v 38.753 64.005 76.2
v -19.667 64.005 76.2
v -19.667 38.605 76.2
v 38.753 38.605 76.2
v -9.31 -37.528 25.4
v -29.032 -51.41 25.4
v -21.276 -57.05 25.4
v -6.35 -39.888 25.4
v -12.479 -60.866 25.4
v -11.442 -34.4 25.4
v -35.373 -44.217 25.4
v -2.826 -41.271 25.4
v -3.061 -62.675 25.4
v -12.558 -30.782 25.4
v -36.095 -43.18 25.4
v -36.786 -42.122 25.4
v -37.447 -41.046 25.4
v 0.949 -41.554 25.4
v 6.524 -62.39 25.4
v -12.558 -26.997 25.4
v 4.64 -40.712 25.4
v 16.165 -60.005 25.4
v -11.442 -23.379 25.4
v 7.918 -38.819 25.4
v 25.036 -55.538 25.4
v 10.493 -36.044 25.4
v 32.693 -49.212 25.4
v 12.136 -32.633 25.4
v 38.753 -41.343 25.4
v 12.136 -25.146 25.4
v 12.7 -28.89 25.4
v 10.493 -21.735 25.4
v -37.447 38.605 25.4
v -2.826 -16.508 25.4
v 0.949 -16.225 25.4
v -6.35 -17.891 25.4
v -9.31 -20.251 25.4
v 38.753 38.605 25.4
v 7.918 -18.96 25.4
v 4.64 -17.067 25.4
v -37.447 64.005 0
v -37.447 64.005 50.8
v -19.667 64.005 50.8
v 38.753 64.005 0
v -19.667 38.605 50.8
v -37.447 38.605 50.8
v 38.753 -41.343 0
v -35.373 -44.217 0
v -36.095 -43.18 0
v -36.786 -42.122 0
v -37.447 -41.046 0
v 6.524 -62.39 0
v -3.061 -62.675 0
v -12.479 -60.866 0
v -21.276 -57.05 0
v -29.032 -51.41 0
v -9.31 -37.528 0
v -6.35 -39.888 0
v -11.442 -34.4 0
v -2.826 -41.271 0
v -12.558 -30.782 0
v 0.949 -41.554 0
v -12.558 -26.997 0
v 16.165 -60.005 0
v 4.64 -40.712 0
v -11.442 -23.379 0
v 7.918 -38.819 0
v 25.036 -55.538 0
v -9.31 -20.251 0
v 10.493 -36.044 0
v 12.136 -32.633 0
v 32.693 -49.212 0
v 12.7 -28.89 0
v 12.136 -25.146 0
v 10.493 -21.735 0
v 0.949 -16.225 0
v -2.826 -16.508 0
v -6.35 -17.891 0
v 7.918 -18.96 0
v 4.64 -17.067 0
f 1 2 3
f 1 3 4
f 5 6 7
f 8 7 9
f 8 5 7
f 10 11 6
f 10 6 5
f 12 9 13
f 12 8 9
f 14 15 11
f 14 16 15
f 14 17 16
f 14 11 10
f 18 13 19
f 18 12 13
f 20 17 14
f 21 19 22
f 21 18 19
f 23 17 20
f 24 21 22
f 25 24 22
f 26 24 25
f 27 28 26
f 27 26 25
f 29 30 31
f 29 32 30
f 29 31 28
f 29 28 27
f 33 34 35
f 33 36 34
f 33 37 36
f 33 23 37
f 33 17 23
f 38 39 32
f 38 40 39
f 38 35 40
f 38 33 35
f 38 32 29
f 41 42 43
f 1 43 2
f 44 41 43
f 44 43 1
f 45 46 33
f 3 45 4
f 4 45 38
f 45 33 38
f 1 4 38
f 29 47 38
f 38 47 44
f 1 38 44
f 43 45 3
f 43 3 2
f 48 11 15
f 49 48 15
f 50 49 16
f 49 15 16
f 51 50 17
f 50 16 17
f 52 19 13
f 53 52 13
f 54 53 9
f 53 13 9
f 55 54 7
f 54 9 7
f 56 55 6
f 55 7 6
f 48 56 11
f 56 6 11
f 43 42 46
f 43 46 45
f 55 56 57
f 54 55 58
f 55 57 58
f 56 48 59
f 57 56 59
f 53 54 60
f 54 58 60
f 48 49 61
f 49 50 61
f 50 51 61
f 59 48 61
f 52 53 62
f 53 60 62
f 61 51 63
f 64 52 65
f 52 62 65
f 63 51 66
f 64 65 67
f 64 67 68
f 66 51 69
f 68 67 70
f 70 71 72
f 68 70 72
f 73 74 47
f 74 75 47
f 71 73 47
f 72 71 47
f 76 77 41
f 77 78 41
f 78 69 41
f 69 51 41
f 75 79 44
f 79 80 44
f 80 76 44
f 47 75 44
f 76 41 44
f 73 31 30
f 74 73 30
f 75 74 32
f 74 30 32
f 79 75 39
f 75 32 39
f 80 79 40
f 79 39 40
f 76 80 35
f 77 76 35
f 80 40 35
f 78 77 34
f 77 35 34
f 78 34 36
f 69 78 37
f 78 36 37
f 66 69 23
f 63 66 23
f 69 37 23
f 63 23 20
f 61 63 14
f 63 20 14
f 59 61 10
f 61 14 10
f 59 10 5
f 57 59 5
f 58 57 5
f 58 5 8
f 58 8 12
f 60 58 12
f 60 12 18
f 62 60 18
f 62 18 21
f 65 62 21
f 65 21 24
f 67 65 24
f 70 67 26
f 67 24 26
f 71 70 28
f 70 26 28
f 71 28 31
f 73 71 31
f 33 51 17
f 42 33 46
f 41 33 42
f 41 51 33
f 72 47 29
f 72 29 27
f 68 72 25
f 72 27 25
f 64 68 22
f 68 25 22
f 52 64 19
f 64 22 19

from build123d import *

# Parameters (mm, degrees)
F0_W      = 76.2
F0_H      = 127
F1_DEPTH  = 25.4
F2_W      = 76.2
F2_H      = 25.4
F3_DEPTH  = 25.4
F4_W      = 58.42
F4_H      = 25.4
F5_DEPTH  = 25.4
F7_R      = 12.7
F8_DEPTH  = 25.4
F9_DEPTH  = 25.4
F10_DEPTH = 25.401


with BuildPart() as f1:
    # F0 (on Top) → F1 (new body)
    with BuildSketch(Plane.XY):
        with Locations((0.6532006686, 0.5051653504)):
            Rectangle(F0_W, F0_H)
    extrude(amount=F1_DEPTH)

    # F2 (on face) → F3 (join)
    with BuildSketch(Plane.XY.offset(25.4)):
        with Locations((0.6532006686, 51.3051653504)):
            Rectangle(F2_W, F2_H)
    extrude(amount=F3_DEPTH)

    # F4 (on face) → F5 (join)
    with BuildSketch(Plane.XY.offset(50.8)):
        with Locations((9.5432006686, 51.3051653504)):
            Rectangle(F4_W, F4_H)
    extrude(amount=F5_DEPTH)

    # F7 (on face) → F8 (cut)
    with BuildSketch(Plane.XY.offset(25.4)):
        with Locations((0, -28.8895512581)):
            Circle(F7_R)
    extrude(amount=-F8_DEPTH, mode=Mode.SUBTRACT)

    # F7 (on face) → F9 (cut)
    with BuildSketch(Plane.XY.offset(25.4)):
        with BuildLine():
            ThreePointArc((6.523787157, -62.3899730255), (-16.9822329005, -59.1992066955), (-35.3734492198, -44.2166457992))
            ThreePointArc((-35.3734492198, -44.2166457992), (-36.4439317634, -42.6534421545), (-37.4467993314, -41.0460233688))
            Line((-37.4467993314, -41.0460233688), (-37.4467993314, -62.9948346496))
            Line((-37.4467993314, -62.9948346496), (38.7532006686, -62.9948346496))
            Line((38.7532006686, -62.9948346496), (38.7532006686, -41.3434579968))
            ThreePointArc((38.7532006686, -41.3434579968), (25.0359793217, -55.5380857369), (6.523787157, -62.3899730255))
        make_face()
    extrude(amount=-F9_DEPTH, mode=Mode.SUBTRACT)

    # F7 (on face) → F10 (cut, through all)
    with BuildSketch(Plane.XY.offset(25.4)):
        with BuildLine():
            ThreePointArc((6.523787157, -62.3899730255), (-16.9822329005, -59.1992066955), (-35.3734492198, -44.2166457992))
            ThreePointArc((-35.3734492198, -44.2166457992), (-36.4439317634, -42.6534421545), (-37.4467993314, -41.0460233688))
            Line((-37.4467993314, -41.0460233688), (-37.4467993314, -62.9948346496))
            Line((-37.4467993314, -62.9948346496), (38.7532006686, -62.9948346496))
            Line((38.7532006686, -62.9948346496), (38.7532006686, -41.3434579968))
            ThreePointArc((38.7532006686, -41.3434579968), (25.0359793217, -55.5380857369), (6.523787157, -62.3899730255))
        make_face()
    extrude(amount=-F10_DEPTH, mode=Mode.SUBTRACT)


solid = f1.part
